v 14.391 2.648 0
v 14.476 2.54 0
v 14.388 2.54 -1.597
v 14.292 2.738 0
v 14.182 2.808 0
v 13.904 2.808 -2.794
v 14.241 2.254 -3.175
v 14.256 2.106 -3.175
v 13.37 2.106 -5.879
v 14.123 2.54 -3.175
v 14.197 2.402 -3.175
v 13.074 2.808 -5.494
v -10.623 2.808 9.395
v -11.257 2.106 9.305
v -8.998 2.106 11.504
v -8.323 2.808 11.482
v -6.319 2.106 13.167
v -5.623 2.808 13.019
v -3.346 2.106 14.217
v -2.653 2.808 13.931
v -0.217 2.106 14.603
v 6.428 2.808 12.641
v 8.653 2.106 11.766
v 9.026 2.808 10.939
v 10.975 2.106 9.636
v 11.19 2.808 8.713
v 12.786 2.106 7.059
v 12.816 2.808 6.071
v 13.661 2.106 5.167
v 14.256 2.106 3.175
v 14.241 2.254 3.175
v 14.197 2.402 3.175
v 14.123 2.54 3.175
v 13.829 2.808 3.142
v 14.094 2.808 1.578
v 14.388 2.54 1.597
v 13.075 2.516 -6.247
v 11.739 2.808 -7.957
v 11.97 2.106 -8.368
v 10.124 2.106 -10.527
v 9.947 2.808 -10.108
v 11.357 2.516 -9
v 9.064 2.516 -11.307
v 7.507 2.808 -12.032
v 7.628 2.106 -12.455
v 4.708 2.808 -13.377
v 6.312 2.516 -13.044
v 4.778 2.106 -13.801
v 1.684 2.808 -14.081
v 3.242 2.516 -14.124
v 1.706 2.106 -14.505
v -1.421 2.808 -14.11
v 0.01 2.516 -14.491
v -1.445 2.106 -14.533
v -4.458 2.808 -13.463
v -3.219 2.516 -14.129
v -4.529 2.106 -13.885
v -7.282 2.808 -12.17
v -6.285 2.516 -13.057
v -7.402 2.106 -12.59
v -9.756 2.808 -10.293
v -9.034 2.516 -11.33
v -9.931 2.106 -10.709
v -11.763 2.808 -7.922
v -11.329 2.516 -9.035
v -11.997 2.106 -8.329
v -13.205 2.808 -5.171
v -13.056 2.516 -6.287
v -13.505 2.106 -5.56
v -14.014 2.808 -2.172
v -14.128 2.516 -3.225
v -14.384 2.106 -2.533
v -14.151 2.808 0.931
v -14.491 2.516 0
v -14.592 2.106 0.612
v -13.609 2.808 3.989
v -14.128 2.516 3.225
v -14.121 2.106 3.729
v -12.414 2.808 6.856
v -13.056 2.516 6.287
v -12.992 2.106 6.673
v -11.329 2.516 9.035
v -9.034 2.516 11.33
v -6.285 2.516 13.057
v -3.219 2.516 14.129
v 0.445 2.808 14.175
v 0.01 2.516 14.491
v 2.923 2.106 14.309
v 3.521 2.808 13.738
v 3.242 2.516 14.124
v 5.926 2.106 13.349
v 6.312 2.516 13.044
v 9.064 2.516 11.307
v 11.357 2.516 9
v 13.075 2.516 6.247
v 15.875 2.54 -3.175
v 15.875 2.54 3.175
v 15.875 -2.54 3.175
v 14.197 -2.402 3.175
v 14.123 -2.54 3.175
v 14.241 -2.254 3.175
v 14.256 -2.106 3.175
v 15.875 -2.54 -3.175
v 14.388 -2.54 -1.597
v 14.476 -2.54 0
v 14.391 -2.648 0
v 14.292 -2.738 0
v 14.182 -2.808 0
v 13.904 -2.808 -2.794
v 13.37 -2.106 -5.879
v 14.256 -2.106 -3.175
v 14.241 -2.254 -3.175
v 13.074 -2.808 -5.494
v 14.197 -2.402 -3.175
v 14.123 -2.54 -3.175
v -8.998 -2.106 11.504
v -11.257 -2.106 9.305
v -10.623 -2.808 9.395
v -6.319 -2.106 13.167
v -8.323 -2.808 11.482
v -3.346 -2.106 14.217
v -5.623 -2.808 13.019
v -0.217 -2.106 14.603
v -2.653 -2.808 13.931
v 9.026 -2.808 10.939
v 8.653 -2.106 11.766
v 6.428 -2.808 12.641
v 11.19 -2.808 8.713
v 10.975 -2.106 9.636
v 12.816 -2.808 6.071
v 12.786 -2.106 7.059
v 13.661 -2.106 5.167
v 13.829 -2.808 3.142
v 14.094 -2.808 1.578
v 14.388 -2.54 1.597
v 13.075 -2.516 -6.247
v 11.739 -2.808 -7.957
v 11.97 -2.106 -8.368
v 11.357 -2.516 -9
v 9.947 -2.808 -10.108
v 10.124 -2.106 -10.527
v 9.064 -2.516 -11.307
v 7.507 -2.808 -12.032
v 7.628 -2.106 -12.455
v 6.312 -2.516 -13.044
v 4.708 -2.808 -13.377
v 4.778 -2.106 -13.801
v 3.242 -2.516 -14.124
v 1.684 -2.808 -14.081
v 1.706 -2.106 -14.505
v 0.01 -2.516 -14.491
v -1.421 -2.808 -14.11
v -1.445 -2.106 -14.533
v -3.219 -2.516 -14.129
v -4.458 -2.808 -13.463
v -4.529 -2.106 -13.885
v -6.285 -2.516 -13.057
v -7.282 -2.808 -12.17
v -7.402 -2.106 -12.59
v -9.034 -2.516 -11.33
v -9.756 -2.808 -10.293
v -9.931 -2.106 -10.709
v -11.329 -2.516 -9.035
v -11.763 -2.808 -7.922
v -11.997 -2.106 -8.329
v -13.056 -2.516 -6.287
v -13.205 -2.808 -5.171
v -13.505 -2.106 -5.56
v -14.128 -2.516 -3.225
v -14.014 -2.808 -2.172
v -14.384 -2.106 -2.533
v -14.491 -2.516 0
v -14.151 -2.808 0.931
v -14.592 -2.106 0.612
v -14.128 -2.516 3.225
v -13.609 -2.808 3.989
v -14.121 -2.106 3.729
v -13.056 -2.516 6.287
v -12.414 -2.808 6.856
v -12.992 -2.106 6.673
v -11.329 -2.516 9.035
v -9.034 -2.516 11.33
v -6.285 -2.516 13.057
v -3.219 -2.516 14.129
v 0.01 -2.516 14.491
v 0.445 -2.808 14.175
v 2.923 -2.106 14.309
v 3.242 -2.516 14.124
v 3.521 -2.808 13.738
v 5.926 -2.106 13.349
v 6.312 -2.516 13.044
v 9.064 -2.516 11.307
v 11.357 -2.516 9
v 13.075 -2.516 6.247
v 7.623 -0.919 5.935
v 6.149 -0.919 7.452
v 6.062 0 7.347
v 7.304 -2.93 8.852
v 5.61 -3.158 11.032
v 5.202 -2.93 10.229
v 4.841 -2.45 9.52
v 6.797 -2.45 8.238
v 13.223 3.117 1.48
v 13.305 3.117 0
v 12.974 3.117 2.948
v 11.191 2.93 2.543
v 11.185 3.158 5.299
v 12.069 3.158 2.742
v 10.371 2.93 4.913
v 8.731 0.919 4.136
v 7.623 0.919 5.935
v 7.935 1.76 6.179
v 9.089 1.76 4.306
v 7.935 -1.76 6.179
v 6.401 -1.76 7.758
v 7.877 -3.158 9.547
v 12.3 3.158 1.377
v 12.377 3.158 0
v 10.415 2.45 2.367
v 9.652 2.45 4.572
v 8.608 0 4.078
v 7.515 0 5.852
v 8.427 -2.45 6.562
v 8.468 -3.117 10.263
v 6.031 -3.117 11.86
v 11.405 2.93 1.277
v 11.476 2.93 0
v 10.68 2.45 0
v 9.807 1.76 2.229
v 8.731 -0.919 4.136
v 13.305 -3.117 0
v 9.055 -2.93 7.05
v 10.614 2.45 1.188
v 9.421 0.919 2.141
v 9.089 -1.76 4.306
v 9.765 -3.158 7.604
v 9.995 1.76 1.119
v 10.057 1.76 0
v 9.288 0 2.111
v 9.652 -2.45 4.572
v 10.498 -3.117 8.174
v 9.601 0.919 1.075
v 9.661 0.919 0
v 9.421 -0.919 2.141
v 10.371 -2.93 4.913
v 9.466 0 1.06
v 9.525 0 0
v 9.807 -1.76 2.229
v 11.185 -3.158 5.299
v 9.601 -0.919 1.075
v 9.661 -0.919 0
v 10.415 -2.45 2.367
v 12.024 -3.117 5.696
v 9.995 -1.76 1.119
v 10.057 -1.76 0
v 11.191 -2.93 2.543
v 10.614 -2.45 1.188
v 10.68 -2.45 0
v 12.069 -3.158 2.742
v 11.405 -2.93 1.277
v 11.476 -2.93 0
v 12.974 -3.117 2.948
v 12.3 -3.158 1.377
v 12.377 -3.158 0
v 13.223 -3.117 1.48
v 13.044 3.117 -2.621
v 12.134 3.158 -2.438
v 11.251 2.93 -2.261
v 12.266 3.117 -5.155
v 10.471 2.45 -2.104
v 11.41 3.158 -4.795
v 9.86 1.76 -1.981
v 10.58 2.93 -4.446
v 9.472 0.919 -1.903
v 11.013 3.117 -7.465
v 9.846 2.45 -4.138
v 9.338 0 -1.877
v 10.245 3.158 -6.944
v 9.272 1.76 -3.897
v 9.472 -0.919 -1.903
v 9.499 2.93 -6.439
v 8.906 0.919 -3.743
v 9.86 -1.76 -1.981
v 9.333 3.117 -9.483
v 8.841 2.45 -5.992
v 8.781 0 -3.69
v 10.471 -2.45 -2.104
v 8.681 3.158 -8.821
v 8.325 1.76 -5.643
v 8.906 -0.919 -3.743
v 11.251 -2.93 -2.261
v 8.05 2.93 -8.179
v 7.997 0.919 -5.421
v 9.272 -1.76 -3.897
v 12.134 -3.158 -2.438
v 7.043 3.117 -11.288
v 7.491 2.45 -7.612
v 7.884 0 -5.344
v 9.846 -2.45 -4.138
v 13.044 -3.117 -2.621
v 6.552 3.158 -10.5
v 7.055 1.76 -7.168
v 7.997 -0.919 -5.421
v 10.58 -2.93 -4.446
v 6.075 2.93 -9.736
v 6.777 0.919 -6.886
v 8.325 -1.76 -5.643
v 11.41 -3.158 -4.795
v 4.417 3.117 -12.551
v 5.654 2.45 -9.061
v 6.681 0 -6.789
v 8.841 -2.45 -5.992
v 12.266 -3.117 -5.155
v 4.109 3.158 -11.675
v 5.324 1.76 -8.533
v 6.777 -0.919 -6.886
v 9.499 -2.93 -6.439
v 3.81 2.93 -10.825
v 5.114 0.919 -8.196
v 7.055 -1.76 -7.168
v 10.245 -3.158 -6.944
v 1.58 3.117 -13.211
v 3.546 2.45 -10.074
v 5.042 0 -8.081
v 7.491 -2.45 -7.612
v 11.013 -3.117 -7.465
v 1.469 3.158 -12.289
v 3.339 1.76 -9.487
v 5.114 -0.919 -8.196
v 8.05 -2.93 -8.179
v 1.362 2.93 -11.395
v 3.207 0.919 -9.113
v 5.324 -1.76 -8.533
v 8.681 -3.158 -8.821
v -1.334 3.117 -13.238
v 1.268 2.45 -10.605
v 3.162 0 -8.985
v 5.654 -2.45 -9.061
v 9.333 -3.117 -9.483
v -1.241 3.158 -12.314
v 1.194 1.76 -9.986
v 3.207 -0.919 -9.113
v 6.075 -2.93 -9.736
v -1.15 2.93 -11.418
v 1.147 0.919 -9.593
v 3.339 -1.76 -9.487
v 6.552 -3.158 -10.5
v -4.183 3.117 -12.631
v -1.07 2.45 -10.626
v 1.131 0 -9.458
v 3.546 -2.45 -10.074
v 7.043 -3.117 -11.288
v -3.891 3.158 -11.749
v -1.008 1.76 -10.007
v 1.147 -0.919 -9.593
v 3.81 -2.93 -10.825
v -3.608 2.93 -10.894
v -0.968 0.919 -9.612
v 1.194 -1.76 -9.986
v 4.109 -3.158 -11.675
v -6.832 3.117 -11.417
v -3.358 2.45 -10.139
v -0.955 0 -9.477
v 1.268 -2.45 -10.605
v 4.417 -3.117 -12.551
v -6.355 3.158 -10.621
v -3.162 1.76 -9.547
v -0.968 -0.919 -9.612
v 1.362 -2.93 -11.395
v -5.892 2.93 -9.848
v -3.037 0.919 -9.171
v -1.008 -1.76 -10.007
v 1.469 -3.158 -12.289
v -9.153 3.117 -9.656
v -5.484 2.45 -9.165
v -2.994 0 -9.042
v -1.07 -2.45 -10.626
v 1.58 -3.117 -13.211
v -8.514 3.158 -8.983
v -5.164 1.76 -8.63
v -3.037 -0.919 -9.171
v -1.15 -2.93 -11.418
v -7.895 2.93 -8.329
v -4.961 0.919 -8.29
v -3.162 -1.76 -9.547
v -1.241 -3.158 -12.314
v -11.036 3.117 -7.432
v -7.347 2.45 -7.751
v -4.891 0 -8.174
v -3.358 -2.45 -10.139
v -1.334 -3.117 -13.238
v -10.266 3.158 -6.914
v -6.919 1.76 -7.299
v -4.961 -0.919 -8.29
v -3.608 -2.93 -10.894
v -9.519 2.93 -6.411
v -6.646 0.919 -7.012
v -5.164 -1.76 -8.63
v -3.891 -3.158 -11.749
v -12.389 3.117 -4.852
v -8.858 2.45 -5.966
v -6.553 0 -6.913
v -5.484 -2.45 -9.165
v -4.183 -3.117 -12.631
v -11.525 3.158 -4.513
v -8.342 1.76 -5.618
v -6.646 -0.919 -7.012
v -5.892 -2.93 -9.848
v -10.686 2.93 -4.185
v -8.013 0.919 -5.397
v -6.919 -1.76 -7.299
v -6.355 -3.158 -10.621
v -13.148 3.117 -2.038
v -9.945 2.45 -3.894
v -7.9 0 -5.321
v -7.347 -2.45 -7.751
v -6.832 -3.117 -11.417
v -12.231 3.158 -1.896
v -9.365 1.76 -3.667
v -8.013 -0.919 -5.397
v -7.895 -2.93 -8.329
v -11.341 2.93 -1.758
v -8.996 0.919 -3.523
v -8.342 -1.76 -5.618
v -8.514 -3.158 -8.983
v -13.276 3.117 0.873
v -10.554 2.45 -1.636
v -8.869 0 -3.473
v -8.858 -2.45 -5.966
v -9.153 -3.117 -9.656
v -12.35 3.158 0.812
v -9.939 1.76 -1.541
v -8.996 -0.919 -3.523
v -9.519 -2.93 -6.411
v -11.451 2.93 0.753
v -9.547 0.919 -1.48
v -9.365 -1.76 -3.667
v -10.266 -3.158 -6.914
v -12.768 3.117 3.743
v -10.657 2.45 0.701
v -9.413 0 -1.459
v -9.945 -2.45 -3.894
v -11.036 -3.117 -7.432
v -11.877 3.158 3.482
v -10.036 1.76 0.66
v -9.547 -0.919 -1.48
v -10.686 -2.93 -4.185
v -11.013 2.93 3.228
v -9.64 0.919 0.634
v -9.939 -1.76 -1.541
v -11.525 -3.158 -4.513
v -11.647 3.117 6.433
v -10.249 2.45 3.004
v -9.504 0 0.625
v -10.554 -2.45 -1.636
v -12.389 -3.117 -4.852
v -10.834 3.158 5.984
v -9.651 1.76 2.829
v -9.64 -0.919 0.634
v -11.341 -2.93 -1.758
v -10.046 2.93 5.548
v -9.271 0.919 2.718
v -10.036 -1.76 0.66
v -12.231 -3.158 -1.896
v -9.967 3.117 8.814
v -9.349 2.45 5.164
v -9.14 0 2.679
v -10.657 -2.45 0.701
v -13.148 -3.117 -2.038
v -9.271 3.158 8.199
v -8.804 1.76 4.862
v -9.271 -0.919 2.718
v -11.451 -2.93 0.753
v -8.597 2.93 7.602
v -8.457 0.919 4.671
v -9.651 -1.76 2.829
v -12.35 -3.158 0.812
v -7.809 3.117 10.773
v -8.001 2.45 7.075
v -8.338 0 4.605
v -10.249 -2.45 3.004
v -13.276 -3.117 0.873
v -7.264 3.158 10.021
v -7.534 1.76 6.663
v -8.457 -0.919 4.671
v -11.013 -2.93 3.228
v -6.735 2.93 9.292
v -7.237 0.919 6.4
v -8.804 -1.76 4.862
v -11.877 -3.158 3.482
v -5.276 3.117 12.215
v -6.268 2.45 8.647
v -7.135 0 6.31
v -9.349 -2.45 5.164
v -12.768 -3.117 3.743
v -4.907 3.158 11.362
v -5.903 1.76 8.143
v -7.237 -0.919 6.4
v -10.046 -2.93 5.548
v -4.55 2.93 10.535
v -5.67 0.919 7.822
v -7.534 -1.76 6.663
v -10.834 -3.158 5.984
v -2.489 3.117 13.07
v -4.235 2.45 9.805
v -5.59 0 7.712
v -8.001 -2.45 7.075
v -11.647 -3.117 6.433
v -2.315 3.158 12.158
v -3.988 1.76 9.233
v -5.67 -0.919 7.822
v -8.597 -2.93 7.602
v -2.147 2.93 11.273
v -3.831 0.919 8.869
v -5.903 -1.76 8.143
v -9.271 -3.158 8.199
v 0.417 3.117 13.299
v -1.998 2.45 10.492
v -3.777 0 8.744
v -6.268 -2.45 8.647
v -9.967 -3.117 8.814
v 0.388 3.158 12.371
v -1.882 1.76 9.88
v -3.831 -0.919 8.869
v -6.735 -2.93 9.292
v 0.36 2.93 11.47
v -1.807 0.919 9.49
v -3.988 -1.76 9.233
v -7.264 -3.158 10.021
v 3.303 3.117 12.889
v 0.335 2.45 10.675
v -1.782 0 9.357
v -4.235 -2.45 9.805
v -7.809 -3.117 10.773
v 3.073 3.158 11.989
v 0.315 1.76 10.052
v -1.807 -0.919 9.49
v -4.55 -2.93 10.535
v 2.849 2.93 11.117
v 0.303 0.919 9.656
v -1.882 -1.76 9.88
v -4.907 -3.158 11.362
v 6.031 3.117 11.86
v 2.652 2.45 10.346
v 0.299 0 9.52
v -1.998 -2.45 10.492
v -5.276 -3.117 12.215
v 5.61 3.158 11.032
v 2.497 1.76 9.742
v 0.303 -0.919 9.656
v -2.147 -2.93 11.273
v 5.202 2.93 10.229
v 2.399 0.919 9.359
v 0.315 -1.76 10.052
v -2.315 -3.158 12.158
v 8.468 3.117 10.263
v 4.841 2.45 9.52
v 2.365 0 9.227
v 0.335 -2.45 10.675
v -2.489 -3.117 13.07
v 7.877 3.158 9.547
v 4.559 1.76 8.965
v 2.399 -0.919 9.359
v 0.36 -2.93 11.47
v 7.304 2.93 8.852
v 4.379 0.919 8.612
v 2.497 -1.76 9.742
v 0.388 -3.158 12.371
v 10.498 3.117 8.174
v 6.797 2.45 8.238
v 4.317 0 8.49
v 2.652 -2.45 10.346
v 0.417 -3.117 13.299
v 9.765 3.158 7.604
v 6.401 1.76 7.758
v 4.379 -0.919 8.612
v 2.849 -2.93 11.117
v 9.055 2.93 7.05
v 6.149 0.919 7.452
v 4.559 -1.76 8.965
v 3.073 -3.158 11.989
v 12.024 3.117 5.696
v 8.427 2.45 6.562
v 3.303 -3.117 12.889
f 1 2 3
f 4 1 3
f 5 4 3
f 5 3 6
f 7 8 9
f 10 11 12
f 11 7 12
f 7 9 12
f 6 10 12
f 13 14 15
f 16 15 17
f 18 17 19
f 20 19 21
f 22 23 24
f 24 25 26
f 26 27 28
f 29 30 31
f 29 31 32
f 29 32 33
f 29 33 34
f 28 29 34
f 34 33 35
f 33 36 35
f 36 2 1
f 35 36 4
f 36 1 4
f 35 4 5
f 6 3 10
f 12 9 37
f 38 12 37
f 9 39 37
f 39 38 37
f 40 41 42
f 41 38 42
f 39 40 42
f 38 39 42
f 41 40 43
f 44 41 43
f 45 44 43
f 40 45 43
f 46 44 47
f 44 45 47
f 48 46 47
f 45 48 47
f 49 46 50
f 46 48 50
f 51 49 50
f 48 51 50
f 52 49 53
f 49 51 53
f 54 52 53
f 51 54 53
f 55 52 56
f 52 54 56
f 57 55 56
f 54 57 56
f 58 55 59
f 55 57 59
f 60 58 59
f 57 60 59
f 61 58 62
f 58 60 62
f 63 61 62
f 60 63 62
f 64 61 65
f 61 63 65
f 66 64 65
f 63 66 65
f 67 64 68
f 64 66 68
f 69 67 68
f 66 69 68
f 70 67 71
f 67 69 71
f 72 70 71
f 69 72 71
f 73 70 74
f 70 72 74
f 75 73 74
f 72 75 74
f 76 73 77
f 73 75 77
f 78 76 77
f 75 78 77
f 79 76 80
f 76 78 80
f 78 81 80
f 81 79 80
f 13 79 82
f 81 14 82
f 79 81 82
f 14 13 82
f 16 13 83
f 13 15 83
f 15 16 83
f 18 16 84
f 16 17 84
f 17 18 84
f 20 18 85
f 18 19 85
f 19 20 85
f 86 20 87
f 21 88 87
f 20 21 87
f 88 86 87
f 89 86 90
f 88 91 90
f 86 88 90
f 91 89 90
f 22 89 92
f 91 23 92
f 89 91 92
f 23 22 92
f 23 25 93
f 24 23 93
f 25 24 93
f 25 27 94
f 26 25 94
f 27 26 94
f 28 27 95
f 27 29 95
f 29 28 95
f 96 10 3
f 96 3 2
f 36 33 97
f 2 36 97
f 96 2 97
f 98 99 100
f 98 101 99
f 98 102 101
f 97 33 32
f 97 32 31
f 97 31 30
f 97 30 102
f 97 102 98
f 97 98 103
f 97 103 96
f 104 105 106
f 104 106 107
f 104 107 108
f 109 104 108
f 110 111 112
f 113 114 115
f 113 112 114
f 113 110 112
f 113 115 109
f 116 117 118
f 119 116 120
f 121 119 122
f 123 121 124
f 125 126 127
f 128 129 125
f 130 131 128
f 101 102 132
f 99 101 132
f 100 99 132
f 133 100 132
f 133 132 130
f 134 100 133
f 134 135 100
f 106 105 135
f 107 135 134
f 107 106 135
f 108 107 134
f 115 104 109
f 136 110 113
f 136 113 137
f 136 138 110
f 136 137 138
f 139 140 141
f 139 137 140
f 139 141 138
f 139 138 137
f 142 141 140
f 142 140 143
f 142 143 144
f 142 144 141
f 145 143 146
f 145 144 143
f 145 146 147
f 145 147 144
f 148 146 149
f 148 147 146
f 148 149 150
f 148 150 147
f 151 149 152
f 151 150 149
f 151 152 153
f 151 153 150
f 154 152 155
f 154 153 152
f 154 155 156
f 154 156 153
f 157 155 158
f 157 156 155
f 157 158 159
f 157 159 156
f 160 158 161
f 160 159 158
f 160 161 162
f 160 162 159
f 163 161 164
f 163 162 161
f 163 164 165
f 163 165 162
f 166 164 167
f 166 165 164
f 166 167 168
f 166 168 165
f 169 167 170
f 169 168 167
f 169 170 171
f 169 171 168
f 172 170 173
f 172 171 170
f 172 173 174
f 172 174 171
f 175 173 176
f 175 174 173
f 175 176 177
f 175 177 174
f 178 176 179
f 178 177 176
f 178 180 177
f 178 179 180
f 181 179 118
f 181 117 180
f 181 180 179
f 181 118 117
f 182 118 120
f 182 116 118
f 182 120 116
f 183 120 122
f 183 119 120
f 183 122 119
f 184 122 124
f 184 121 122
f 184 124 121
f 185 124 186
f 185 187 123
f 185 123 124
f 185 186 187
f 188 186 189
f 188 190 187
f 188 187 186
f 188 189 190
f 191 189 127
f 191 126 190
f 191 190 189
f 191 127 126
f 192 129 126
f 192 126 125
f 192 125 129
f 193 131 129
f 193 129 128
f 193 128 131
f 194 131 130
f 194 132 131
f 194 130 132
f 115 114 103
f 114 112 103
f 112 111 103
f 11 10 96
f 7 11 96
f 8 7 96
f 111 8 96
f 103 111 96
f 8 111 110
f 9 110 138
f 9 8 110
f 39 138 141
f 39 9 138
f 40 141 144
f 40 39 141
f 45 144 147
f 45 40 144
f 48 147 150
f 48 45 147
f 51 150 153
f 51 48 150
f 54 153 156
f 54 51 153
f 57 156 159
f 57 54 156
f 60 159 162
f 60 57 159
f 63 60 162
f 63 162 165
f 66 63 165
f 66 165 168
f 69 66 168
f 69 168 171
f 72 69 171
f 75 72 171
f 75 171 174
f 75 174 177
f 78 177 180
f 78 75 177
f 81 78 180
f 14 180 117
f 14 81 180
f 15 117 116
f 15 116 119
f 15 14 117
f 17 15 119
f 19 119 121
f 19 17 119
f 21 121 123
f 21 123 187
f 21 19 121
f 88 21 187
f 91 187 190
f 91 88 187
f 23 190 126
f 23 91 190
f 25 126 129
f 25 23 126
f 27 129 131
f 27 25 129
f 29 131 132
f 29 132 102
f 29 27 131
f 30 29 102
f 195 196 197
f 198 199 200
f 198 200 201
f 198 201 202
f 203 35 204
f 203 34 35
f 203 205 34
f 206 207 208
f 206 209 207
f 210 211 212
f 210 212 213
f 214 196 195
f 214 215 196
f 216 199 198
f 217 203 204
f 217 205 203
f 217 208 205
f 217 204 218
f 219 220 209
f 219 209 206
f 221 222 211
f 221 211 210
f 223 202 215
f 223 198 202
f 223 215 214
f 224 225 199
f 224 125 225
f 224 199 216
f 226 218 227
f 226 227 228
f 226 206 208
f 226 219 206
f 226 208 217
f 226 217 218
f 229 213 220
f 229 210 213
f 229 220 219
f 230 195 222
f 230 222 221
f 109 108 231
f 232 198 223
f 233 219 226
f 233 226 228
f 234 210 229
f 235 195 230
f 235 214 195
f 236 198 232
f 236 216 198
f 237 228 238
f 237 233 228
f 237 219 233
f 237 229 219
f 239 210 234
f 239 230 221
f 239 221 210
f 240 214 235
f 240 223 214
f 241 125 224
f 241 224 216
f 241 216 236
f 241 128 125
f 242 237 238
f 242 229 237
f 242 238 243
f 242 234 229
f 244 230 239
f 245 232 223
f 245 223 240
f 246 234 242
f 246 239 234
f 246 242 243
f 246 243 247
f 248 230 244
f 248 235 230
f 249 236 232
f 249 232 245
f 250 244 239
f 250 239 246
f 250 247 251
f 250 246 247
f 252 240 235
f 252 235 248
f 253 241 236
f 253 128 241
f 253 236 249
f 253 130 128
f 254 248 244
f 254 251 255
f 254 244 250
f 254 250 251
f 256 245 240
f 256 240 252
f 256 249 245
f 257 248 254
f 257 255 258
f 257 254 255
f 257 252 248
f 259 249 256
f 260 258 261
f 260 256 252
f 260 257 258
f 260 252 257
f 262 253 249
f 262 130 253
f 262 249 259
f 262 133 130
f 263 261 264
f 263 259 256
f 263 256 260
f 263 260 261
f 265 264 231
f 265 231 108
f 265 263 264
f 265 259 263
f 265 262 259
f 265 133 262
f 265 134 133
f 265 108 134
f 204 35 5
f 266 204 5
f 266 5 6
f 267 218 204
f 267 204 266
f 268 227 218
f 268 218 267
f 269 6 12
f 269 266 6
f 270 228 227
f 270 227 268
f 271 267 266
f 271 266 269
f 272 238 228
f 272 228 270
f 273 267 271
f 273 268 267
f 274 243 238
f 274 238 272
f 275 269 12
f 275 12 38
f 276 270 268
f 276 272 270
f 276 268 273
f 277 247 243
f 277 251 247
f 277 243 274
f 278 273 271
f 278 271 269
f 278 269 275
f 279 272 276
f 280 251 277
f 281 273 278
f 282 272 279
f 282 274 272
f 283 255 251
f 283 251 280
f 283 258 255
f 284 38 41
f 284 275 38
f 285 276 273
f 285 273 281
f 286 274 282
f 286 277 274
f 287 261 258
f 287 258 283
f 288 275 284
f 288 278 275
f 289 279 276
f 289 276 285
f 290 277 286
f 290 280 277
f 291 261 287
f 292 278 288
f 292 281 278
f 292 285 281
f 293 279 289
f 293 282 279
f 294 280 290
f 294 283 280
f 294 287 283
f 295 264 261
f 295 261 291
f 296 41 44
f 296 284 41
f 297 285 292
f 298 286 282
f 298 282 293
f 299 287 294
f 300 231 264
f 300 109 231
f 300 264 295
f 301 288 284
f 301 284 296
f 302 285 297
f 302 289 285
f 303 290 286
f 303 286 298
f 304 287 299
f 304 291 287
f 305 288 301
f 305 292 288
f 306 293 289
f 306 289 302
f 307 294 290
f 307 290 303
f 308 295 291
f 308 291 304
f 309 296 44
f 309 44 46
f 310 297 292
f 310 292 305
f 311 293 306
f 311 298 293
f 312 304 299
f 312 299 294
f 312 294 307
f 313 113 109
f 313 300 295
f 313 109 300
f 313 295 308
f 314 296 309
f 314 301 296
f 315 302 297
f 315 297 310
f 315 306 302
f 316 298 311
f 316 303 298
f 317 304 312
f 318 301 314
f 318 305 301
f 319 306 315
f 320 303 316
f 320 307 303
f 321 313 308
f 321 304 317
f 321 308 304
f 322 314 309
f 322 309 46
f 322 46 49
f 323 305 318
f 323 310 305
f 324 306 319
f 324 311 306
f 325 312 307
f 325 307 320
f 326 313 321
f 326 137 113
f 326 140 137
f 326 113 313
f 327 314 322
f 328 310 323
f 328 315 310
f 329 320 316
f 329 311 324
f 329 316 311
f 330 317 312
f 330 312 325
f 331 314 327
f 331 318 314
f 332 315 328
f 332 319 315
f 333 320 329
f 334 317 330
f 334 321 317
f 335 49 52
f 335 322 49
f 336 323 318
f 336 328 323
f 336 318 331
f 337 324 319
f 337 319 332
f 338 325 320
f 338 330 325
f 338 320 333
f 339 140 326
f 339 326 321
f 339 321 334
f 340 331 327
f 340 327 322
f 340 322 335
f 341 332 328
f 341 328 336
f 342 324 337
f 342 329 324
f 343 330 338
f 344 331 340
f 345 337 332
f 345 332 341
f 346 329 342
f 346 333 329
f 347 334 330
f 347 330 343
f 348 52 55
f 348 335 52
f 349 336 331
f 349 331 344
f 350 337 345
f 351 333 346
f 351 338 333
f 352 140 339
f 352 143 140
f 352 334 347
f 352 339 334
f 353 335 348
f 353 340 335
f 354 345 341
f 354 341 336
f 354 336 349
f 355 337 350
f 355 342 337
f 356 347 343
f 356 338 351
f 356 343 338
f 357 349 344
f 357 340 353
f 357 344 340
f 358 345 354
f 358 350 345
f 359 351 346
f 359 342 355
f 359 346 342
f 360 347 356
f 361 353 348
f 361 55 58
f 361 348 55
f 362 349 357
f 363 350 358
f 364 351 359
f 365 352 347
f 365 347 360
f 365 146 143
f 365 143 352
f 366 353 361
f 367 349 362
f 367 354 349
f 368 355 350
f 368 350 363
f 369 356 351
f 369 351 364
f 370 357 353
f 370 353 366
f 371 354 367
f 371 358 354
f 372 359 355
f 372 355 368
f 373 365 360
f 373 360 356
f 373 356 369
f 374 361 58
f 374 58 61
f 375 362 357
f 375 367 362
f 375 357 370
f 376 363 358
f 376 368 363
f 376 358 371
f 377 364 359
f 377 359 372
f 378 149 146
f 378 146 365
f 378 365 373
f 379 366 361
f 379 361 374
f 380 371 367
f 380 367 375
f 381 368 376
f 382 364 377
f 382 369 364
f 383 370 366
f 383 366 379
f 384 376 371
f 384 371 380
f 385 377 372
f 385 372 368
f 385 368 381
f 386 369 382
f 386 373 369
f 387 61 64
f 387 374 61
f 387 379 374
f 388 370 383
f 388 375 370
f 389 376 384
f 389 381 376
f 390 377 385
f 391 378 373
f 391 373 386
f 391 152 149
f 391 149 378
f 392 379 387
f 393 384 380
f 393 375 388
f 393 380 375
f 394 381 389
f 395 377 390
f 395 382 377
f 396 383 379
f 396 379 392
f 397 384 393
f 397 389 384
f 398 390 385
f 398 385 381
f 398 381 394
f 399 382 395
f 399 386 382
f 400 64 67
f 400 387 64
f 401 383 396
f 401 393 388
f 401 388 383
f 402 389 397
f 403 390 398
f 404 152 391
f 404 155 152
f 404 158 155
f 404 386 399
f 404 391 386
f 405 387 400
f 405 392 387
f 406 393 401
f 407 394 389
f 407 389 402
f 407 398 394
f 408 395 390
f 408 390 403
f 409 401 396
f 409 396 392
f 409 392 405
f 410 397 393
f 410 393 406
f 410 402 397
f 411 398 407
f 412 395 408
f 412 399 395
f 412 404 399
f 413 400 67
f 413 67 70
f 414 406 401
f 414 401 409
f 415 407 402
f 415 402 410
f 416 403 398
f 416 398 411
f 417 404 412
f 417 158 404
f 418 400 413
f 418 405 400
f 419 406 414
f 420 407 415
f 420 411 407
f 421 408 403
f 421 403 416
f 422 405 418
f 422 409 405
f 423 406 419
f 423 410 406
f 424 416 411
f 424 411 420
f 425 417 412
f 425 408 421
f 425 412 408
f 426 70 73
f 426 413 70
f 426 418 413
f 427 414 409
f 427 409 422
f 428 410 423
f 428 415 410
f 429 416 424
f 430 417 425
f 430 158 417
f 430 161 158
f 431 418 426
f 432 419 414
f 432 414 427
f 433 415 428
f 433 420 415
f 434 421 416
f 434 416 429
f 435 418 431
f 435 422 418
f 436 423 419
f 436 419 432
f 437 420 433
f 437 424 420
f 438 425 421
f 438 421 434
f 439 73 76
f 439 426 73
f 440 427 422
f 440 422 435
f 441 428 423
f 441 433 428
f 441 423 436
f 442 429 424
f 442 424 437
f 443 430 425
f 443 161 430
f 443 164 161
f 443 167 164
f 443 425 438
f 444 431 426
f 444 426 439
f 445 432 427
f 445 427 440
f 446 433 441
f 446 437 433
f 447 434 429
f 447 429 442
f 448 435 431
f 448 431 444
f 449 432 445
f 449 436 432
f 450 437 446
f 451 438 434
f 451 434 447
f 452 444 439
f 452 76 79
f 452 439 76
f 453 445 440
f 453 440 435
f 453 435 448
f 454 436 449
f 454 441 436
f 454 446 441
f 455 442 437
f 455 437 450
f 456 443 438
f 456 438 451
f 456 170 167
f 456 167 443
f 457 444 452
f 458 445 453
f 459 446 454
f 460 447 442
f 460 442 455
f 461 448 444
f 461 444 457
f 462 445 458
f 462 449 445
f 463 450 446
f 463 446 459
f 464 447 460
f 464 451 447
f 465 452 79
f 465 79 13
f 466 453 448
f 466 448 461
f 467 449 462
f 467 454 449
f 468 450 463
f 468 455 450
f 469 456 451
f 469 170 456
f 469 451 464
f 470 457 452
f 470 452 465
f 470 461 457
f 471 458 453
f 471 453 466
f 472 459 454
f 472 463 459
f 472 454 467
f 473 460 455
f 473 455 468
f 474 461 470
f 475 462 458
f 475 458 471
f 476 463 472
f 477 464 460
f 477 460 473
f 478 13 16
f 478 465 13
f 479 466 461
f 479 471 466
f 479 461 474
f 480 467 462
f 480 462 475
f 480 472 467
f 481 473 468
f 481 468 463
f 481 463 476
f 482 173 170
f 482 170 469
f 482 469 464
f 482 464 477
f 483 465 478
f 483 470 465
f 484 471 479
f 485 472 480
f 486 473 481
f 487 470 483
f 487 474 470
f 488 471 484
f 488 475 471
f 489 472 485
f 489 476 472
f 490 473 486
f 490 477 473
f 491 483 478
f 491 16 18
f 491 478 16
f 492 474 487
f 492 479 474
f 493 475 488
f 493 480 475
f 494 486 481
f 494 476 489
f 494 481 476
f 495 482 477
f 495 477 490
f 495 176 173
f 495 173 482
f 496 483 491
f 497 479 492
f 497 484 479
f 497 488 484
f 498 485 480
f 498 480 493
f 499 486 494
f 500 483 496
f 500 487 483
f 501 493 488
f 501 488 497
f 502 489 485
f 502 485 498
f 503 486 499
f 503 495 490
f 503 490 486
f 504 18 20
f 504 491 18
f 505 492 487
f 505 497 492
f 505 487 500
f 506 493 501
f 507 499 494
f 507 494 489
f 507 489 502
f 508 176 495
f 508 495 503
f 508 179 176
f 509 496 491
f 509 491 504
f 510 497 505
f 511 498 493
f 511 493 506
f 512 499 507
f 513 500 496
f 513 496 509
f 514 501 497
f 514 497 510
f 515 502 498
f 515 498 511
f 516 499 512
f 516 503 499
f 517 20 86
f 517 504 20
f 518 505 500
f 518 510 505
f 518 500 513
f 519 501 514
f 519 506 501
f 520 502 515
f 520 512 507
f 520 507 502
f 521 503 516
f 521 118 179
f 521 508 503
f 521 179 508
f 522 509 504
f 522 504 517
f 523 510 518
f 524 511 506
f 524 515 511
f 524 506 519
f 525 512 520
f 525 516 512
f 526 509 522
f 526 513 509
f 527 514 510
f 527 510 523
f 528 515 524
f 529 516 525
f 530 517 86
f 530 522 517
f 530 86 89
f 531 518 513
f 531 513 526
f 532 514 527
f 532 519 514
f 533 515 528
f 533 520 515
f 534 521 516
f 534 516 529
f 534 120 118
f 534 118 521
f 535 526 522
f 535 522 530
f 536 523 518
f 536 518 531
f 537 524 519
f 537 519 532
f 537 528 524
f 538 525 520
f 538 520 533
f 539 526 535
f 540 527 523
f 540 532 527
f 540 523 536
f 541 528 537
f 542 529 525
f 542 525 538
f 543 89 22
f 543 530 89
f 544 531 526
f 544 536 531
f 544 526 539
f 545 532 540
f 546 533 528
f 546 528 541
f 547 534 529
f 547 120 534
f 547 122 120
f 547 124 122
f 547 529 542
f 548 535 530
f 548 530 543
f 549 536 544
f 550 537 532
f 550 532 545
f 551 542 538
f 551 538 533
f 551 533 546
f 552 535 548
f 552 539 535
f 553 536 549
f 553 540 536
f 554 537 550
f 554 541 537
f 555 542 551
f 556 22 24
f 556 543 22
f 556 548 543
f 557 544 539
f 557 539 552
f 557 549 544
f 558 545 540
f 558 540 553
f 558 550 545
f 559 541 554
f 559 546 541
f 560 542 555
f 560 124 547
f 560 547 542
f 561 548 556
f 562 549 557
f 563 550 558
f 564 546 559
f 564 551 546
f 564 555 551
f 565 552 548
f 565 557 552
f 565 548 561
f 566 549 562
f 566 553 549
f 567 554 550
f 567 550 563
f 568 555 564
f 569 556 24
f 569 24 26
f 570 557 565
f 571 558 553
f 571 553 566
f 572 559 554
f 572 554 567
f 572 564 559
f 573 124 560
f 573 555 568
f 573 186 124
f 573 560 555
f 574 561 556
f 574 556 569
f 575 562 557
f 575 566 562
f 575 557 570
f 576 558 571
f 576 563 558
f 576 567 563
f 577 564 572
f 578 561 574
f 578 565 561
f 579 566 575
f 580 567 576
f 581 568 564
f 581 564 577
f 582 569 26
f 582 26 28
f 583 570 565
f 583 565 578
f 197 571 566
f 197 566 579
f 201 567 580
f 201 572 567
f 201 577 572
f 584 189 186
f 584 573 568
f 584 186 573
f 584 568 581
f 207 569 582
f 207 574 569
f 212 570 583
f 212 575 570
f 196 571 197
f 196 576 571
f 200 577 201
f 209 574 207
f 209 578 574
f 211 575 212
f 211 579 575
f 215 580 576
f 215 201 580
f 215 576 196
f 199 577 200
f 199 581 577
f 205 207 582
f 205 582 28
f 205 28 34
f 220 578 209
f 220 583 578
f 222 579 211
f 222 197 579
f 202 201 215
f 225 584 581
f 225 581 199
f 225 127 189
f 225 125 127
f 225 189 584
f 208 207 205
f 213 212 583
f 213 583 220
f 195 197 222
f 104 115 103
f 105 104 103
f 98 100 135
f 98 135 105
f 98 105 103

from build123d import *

# Parameters (mm, degrees)
F2_R     = 0.79375
F3_W     = 1.905
F3_H     = 5.08
F4_DEPTH = 3.175


with BuildPart() as f1:
    # F0 (on Top) → F1 (revolve)
    with BuildSketch(Plane.XY):
        with BuildLine():
            Line((14.605, -2.54), (14.605, 2.54))
            ThreePointArc((14.605, 2.54), (9.525, 0), (14.605, -2.54))
        make_face()
    revolve(axis=Axis((0, 7.2536539203, 0), (0, 1, 0)))

    # F2
    f2_edges = [f1.edges().sort_by_distance(p)[0] for p in [
        (-14.605, 2.54, 0),
        (-14.605, -2.54, 0),
    ]]
    fillet(f2_edges, radius=F2_R)

    # F3 (on Top) → F4 (join, symmetric)
    with BuildSketch(Plane.XY):
        with Locations((14.9225, 0)):
            Rectangle(F3_W, F3_H)
    extrude(amount=F4_DEPTH, both=True)


solid = f1.part
